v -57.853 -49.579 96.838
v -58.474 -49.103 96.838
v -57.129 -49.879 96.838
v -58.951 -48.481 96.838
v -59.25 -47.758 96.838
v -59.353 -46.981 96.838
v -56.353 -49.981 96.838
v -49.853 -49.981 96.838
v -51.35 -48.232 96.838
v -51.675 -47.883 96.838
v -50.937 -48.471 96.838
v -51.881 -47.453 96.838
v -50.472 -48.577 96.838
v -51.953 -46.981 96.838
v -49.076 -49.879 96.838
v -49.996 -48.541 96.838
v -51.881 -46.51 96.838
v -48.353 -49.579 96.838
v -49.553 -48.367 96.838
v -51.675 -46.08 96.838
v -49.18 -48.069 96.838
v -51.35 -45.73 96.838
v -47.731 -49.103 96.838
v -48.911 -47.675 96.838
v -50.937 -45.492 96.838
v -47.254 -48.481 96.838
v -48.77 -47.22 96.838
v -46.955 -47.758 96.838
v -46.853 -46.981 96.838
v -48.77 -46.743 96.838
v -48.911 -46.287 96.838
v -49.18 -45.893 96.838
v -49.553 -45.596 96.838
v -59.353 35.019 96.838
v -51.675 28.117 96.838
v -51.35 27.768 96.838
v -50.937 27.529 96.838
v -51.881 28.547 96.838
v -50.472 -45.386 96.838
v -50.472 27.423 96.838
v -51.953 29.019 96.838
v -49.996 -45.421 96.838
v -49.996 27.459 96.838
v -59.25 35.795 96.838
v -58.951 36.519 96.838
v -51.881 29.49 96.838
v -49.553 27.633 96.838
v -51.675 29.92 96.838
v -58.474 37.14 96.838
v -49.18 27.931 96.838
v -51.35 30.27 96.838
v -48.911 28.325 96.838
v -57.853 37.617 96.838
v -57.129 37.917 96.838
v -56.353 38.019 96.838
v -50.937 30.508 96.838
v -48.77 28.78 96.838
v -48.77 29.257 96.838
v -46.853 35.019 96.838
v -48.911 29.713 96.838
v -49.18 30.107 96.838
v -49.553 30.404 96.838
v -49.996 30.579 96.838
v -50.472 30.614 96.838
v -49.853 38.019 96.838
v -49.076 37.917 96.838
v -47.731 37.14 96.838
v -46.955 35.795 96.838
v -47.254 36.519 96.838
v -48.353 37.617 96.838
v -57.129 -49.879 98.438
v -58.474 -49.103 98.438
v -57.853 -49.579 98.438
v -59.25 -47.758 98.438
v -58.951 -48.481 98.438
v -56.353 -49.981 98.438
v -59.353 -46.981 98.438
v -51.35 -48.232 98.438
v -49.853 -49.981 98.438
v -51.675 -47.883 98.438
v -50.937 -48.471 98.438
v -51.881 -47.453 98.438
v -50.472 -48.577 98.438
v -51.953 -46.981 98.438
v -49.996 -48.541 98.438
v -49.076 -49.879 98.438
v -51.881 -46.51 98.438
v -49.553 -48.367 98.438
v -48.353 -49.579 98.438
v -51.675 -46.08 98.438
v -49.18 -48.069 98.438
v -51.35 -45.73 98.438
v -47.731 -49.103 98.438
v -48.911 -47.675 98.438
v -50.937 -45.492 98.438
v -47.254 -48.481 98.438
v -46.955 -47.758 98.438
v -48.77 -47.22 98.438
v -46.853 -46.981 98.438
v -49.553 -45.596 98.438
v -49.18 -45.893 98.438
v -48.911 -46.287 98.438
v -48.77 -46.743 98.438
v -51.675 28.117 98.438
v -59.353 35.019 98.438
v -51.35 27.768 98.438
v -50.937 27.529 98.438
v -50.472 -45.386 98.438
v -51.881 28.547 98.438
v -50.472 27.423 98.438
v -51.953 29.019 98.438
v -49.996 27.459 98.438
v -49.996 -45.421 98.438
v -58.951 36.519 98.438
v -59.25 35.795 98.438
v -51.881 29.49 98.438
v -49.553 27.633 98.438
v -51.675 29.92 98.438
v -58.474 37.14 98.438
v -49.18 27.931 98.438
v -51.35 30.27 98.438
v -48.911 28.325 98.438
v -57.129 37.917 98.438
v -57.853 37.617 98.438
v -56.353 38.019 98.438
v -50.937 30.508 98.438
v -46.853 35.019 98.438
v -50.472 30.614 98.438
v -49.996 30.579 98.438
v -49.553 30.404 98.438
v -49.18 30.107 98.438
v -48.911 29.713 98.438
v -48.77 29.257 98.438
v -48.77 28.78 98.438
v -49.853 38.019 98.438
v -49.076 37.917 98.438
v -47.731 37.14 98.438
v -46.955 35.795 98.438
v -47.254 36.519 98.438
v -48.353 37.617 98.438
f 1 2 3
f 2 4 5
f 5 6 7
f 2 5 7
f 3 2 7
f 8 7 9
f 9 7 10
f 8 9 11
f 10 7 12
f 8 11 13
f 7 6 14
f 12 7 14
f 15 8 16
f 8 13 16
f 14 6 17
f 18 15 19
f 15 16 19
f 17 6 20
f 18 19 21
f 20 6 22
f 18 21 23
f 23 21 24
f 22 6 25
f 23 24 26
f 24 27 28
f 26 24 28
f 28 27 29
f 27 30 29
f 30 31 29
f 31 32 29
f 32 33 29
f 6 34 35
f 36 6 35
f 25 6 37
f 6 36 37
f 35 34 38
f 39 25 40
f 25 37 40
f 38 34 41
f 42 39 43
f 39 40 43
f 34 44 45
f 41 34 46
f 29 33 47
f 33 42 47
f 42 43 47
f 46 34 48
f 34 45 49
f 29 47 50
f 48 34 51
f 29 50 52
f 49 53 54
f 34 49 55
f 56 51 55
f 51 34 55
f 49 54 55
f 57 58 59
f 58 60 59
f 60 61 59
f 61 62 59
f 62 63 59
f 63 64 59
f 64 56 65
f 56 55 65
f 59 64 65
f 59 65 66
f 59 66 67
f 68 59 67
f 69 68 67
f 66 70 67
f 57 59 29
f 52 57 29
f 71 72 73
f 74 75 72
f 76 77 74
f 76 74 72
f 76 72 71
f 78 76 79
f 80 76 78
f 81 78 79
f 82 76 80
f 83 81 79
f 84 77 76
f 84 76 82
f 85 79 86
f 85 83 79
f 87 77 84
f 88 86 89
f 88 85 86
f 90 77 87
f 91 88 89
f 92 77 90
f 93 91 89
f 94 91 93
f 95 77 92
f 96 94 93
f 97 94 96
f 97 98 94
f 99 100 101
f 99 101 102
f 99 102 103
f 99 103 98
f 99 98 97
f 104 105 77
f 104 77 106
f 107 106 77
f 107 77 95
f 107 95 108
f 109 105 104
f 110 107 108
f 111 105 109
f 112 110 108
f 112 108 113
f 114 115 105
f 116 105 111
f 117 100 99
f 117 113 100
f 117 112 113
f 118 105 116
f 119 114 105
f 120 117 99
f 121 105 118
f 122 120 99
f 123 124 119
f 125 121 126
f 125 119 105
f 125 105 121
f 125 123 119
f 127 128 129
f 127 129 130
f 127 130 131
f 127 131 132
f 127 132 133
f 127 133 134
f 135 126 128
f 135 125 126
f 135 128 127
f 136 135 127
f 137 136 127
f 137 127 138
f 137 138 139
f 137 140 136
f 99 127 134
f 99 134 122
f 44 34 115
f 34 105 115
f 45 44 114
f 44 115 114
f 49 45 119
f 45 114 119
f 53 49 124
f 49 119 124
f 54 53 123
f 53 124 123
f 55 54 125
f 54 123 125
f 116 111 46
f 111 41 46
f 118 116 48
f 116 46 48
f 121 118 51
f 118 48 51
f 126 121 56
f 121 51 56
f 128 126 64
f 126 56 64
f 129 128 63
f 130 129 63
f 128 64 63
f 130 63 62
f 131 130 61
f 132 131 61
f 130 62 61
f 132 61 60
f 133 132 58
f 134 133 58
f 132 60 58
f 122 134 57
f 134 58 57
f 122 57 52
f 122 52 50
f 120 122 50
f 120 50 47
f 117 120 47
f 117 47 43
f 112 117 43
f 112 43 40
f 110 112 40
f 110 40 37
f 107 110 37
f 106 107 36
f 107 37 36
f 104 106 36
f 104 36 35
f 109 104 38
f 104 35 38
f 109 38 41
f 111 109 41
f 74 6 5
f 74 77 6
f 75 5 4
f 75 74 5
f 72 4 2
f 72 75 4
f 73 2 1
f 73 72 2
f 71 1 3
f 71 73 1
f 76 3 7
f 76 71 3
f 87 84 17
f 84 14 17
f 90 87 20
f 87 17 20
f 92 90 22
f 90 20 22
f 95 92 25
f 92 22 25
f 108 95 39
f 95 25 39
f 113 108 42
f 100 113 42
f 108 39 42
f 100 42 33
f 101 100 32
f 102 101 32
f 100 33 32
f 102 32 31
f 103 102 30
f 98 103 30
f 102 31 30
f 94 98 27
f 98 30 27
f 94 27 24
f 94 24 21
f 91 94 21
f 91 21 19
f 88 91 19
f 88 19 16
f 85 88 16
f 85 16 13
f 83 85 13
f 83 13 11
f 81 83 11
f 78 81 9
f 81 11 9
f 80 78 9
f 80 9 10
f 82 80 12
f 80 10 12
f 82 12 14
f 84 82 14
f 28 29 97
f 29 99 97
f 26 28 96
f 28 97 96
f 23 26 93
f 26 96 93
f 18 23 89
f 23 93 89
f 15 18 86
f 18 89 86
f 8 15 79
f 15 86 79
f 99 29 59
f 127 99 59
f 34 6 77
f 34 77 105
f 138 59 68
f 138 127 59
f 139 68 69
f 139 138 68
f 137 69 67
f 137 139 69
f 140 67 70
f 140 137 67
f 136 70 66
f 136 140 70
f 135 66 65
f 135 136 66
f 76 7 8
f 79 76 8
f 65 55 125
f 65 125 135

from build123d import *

# Parameters (mm, degrees)
SKETCH2_W                      = 12.5
SKETCH2_H                      = 88
BOSS_EXTRUDE1_DEPTH            = 1.6
F_3_2_3_2_DIAMETER_HOLE1_D     = 3.2
F_3_2_3_2_DIAMETER_HOLE1_DEPTH = 1.6
F_3_2_3_2_DIAMETER_HOLE1_TIP   = 0.96137699
FILLET1_R                      = 3


with BuildPart() as part:
    # Sketch2 → Boss-Extrude1 (new body)
    with BuildSketch(Plane.XY.offset(96.838346843)):
        with Locations((-53.102520427, -5.981220417)):
            Rectangle(SKETCH2_W, SKETCH2_H)
    extrude(amount=BOSS_EXTRUDE1_DEPTH)

    # Ø3.2 (3.2) Diameter Hole1
    with Locations(Plane.XY.offset(98.438346843)):
        with Locations((-50.352520427, 29.018779583), (-50.352520427, -46.981220417)):
            Hole(F_3_2_3_2_DIAMETER_HOLE1_D / 2, depth=F_3_2_3_2_DIAMETER_HOLE1_DEPTH)
            with Locations((0, 0, -(F_3_2_3_2_DIAMETER_HOLE1_DEPTH + F_3_2_3_2_DIAMETER_HOLE1_TIP / 2))):  # 118° drill point
                Cone(0, F_3_2_3_2_DIAMETER_HOLE1_D / 2, F_3_2_3_2_DIAMETER_HOLE1_TIP, mode=Mode.SUBTRACT)

    # Fillet1
    fillet1_edges = [part.edges().sort_by_distance(p)[0] for p in [
        (-46.852520427, -49.981220417, 97.638346843),
        (-59.352520427, -49.981220417, 97.638346843),
        (-59.352520427, 38.018779583, 97.638346843),
        (-46.852520427, 38.018779583, 97.638346843),
    ]]
    fillet(fillet1_edges, radius=FILLET1_R)


solid = part.part
